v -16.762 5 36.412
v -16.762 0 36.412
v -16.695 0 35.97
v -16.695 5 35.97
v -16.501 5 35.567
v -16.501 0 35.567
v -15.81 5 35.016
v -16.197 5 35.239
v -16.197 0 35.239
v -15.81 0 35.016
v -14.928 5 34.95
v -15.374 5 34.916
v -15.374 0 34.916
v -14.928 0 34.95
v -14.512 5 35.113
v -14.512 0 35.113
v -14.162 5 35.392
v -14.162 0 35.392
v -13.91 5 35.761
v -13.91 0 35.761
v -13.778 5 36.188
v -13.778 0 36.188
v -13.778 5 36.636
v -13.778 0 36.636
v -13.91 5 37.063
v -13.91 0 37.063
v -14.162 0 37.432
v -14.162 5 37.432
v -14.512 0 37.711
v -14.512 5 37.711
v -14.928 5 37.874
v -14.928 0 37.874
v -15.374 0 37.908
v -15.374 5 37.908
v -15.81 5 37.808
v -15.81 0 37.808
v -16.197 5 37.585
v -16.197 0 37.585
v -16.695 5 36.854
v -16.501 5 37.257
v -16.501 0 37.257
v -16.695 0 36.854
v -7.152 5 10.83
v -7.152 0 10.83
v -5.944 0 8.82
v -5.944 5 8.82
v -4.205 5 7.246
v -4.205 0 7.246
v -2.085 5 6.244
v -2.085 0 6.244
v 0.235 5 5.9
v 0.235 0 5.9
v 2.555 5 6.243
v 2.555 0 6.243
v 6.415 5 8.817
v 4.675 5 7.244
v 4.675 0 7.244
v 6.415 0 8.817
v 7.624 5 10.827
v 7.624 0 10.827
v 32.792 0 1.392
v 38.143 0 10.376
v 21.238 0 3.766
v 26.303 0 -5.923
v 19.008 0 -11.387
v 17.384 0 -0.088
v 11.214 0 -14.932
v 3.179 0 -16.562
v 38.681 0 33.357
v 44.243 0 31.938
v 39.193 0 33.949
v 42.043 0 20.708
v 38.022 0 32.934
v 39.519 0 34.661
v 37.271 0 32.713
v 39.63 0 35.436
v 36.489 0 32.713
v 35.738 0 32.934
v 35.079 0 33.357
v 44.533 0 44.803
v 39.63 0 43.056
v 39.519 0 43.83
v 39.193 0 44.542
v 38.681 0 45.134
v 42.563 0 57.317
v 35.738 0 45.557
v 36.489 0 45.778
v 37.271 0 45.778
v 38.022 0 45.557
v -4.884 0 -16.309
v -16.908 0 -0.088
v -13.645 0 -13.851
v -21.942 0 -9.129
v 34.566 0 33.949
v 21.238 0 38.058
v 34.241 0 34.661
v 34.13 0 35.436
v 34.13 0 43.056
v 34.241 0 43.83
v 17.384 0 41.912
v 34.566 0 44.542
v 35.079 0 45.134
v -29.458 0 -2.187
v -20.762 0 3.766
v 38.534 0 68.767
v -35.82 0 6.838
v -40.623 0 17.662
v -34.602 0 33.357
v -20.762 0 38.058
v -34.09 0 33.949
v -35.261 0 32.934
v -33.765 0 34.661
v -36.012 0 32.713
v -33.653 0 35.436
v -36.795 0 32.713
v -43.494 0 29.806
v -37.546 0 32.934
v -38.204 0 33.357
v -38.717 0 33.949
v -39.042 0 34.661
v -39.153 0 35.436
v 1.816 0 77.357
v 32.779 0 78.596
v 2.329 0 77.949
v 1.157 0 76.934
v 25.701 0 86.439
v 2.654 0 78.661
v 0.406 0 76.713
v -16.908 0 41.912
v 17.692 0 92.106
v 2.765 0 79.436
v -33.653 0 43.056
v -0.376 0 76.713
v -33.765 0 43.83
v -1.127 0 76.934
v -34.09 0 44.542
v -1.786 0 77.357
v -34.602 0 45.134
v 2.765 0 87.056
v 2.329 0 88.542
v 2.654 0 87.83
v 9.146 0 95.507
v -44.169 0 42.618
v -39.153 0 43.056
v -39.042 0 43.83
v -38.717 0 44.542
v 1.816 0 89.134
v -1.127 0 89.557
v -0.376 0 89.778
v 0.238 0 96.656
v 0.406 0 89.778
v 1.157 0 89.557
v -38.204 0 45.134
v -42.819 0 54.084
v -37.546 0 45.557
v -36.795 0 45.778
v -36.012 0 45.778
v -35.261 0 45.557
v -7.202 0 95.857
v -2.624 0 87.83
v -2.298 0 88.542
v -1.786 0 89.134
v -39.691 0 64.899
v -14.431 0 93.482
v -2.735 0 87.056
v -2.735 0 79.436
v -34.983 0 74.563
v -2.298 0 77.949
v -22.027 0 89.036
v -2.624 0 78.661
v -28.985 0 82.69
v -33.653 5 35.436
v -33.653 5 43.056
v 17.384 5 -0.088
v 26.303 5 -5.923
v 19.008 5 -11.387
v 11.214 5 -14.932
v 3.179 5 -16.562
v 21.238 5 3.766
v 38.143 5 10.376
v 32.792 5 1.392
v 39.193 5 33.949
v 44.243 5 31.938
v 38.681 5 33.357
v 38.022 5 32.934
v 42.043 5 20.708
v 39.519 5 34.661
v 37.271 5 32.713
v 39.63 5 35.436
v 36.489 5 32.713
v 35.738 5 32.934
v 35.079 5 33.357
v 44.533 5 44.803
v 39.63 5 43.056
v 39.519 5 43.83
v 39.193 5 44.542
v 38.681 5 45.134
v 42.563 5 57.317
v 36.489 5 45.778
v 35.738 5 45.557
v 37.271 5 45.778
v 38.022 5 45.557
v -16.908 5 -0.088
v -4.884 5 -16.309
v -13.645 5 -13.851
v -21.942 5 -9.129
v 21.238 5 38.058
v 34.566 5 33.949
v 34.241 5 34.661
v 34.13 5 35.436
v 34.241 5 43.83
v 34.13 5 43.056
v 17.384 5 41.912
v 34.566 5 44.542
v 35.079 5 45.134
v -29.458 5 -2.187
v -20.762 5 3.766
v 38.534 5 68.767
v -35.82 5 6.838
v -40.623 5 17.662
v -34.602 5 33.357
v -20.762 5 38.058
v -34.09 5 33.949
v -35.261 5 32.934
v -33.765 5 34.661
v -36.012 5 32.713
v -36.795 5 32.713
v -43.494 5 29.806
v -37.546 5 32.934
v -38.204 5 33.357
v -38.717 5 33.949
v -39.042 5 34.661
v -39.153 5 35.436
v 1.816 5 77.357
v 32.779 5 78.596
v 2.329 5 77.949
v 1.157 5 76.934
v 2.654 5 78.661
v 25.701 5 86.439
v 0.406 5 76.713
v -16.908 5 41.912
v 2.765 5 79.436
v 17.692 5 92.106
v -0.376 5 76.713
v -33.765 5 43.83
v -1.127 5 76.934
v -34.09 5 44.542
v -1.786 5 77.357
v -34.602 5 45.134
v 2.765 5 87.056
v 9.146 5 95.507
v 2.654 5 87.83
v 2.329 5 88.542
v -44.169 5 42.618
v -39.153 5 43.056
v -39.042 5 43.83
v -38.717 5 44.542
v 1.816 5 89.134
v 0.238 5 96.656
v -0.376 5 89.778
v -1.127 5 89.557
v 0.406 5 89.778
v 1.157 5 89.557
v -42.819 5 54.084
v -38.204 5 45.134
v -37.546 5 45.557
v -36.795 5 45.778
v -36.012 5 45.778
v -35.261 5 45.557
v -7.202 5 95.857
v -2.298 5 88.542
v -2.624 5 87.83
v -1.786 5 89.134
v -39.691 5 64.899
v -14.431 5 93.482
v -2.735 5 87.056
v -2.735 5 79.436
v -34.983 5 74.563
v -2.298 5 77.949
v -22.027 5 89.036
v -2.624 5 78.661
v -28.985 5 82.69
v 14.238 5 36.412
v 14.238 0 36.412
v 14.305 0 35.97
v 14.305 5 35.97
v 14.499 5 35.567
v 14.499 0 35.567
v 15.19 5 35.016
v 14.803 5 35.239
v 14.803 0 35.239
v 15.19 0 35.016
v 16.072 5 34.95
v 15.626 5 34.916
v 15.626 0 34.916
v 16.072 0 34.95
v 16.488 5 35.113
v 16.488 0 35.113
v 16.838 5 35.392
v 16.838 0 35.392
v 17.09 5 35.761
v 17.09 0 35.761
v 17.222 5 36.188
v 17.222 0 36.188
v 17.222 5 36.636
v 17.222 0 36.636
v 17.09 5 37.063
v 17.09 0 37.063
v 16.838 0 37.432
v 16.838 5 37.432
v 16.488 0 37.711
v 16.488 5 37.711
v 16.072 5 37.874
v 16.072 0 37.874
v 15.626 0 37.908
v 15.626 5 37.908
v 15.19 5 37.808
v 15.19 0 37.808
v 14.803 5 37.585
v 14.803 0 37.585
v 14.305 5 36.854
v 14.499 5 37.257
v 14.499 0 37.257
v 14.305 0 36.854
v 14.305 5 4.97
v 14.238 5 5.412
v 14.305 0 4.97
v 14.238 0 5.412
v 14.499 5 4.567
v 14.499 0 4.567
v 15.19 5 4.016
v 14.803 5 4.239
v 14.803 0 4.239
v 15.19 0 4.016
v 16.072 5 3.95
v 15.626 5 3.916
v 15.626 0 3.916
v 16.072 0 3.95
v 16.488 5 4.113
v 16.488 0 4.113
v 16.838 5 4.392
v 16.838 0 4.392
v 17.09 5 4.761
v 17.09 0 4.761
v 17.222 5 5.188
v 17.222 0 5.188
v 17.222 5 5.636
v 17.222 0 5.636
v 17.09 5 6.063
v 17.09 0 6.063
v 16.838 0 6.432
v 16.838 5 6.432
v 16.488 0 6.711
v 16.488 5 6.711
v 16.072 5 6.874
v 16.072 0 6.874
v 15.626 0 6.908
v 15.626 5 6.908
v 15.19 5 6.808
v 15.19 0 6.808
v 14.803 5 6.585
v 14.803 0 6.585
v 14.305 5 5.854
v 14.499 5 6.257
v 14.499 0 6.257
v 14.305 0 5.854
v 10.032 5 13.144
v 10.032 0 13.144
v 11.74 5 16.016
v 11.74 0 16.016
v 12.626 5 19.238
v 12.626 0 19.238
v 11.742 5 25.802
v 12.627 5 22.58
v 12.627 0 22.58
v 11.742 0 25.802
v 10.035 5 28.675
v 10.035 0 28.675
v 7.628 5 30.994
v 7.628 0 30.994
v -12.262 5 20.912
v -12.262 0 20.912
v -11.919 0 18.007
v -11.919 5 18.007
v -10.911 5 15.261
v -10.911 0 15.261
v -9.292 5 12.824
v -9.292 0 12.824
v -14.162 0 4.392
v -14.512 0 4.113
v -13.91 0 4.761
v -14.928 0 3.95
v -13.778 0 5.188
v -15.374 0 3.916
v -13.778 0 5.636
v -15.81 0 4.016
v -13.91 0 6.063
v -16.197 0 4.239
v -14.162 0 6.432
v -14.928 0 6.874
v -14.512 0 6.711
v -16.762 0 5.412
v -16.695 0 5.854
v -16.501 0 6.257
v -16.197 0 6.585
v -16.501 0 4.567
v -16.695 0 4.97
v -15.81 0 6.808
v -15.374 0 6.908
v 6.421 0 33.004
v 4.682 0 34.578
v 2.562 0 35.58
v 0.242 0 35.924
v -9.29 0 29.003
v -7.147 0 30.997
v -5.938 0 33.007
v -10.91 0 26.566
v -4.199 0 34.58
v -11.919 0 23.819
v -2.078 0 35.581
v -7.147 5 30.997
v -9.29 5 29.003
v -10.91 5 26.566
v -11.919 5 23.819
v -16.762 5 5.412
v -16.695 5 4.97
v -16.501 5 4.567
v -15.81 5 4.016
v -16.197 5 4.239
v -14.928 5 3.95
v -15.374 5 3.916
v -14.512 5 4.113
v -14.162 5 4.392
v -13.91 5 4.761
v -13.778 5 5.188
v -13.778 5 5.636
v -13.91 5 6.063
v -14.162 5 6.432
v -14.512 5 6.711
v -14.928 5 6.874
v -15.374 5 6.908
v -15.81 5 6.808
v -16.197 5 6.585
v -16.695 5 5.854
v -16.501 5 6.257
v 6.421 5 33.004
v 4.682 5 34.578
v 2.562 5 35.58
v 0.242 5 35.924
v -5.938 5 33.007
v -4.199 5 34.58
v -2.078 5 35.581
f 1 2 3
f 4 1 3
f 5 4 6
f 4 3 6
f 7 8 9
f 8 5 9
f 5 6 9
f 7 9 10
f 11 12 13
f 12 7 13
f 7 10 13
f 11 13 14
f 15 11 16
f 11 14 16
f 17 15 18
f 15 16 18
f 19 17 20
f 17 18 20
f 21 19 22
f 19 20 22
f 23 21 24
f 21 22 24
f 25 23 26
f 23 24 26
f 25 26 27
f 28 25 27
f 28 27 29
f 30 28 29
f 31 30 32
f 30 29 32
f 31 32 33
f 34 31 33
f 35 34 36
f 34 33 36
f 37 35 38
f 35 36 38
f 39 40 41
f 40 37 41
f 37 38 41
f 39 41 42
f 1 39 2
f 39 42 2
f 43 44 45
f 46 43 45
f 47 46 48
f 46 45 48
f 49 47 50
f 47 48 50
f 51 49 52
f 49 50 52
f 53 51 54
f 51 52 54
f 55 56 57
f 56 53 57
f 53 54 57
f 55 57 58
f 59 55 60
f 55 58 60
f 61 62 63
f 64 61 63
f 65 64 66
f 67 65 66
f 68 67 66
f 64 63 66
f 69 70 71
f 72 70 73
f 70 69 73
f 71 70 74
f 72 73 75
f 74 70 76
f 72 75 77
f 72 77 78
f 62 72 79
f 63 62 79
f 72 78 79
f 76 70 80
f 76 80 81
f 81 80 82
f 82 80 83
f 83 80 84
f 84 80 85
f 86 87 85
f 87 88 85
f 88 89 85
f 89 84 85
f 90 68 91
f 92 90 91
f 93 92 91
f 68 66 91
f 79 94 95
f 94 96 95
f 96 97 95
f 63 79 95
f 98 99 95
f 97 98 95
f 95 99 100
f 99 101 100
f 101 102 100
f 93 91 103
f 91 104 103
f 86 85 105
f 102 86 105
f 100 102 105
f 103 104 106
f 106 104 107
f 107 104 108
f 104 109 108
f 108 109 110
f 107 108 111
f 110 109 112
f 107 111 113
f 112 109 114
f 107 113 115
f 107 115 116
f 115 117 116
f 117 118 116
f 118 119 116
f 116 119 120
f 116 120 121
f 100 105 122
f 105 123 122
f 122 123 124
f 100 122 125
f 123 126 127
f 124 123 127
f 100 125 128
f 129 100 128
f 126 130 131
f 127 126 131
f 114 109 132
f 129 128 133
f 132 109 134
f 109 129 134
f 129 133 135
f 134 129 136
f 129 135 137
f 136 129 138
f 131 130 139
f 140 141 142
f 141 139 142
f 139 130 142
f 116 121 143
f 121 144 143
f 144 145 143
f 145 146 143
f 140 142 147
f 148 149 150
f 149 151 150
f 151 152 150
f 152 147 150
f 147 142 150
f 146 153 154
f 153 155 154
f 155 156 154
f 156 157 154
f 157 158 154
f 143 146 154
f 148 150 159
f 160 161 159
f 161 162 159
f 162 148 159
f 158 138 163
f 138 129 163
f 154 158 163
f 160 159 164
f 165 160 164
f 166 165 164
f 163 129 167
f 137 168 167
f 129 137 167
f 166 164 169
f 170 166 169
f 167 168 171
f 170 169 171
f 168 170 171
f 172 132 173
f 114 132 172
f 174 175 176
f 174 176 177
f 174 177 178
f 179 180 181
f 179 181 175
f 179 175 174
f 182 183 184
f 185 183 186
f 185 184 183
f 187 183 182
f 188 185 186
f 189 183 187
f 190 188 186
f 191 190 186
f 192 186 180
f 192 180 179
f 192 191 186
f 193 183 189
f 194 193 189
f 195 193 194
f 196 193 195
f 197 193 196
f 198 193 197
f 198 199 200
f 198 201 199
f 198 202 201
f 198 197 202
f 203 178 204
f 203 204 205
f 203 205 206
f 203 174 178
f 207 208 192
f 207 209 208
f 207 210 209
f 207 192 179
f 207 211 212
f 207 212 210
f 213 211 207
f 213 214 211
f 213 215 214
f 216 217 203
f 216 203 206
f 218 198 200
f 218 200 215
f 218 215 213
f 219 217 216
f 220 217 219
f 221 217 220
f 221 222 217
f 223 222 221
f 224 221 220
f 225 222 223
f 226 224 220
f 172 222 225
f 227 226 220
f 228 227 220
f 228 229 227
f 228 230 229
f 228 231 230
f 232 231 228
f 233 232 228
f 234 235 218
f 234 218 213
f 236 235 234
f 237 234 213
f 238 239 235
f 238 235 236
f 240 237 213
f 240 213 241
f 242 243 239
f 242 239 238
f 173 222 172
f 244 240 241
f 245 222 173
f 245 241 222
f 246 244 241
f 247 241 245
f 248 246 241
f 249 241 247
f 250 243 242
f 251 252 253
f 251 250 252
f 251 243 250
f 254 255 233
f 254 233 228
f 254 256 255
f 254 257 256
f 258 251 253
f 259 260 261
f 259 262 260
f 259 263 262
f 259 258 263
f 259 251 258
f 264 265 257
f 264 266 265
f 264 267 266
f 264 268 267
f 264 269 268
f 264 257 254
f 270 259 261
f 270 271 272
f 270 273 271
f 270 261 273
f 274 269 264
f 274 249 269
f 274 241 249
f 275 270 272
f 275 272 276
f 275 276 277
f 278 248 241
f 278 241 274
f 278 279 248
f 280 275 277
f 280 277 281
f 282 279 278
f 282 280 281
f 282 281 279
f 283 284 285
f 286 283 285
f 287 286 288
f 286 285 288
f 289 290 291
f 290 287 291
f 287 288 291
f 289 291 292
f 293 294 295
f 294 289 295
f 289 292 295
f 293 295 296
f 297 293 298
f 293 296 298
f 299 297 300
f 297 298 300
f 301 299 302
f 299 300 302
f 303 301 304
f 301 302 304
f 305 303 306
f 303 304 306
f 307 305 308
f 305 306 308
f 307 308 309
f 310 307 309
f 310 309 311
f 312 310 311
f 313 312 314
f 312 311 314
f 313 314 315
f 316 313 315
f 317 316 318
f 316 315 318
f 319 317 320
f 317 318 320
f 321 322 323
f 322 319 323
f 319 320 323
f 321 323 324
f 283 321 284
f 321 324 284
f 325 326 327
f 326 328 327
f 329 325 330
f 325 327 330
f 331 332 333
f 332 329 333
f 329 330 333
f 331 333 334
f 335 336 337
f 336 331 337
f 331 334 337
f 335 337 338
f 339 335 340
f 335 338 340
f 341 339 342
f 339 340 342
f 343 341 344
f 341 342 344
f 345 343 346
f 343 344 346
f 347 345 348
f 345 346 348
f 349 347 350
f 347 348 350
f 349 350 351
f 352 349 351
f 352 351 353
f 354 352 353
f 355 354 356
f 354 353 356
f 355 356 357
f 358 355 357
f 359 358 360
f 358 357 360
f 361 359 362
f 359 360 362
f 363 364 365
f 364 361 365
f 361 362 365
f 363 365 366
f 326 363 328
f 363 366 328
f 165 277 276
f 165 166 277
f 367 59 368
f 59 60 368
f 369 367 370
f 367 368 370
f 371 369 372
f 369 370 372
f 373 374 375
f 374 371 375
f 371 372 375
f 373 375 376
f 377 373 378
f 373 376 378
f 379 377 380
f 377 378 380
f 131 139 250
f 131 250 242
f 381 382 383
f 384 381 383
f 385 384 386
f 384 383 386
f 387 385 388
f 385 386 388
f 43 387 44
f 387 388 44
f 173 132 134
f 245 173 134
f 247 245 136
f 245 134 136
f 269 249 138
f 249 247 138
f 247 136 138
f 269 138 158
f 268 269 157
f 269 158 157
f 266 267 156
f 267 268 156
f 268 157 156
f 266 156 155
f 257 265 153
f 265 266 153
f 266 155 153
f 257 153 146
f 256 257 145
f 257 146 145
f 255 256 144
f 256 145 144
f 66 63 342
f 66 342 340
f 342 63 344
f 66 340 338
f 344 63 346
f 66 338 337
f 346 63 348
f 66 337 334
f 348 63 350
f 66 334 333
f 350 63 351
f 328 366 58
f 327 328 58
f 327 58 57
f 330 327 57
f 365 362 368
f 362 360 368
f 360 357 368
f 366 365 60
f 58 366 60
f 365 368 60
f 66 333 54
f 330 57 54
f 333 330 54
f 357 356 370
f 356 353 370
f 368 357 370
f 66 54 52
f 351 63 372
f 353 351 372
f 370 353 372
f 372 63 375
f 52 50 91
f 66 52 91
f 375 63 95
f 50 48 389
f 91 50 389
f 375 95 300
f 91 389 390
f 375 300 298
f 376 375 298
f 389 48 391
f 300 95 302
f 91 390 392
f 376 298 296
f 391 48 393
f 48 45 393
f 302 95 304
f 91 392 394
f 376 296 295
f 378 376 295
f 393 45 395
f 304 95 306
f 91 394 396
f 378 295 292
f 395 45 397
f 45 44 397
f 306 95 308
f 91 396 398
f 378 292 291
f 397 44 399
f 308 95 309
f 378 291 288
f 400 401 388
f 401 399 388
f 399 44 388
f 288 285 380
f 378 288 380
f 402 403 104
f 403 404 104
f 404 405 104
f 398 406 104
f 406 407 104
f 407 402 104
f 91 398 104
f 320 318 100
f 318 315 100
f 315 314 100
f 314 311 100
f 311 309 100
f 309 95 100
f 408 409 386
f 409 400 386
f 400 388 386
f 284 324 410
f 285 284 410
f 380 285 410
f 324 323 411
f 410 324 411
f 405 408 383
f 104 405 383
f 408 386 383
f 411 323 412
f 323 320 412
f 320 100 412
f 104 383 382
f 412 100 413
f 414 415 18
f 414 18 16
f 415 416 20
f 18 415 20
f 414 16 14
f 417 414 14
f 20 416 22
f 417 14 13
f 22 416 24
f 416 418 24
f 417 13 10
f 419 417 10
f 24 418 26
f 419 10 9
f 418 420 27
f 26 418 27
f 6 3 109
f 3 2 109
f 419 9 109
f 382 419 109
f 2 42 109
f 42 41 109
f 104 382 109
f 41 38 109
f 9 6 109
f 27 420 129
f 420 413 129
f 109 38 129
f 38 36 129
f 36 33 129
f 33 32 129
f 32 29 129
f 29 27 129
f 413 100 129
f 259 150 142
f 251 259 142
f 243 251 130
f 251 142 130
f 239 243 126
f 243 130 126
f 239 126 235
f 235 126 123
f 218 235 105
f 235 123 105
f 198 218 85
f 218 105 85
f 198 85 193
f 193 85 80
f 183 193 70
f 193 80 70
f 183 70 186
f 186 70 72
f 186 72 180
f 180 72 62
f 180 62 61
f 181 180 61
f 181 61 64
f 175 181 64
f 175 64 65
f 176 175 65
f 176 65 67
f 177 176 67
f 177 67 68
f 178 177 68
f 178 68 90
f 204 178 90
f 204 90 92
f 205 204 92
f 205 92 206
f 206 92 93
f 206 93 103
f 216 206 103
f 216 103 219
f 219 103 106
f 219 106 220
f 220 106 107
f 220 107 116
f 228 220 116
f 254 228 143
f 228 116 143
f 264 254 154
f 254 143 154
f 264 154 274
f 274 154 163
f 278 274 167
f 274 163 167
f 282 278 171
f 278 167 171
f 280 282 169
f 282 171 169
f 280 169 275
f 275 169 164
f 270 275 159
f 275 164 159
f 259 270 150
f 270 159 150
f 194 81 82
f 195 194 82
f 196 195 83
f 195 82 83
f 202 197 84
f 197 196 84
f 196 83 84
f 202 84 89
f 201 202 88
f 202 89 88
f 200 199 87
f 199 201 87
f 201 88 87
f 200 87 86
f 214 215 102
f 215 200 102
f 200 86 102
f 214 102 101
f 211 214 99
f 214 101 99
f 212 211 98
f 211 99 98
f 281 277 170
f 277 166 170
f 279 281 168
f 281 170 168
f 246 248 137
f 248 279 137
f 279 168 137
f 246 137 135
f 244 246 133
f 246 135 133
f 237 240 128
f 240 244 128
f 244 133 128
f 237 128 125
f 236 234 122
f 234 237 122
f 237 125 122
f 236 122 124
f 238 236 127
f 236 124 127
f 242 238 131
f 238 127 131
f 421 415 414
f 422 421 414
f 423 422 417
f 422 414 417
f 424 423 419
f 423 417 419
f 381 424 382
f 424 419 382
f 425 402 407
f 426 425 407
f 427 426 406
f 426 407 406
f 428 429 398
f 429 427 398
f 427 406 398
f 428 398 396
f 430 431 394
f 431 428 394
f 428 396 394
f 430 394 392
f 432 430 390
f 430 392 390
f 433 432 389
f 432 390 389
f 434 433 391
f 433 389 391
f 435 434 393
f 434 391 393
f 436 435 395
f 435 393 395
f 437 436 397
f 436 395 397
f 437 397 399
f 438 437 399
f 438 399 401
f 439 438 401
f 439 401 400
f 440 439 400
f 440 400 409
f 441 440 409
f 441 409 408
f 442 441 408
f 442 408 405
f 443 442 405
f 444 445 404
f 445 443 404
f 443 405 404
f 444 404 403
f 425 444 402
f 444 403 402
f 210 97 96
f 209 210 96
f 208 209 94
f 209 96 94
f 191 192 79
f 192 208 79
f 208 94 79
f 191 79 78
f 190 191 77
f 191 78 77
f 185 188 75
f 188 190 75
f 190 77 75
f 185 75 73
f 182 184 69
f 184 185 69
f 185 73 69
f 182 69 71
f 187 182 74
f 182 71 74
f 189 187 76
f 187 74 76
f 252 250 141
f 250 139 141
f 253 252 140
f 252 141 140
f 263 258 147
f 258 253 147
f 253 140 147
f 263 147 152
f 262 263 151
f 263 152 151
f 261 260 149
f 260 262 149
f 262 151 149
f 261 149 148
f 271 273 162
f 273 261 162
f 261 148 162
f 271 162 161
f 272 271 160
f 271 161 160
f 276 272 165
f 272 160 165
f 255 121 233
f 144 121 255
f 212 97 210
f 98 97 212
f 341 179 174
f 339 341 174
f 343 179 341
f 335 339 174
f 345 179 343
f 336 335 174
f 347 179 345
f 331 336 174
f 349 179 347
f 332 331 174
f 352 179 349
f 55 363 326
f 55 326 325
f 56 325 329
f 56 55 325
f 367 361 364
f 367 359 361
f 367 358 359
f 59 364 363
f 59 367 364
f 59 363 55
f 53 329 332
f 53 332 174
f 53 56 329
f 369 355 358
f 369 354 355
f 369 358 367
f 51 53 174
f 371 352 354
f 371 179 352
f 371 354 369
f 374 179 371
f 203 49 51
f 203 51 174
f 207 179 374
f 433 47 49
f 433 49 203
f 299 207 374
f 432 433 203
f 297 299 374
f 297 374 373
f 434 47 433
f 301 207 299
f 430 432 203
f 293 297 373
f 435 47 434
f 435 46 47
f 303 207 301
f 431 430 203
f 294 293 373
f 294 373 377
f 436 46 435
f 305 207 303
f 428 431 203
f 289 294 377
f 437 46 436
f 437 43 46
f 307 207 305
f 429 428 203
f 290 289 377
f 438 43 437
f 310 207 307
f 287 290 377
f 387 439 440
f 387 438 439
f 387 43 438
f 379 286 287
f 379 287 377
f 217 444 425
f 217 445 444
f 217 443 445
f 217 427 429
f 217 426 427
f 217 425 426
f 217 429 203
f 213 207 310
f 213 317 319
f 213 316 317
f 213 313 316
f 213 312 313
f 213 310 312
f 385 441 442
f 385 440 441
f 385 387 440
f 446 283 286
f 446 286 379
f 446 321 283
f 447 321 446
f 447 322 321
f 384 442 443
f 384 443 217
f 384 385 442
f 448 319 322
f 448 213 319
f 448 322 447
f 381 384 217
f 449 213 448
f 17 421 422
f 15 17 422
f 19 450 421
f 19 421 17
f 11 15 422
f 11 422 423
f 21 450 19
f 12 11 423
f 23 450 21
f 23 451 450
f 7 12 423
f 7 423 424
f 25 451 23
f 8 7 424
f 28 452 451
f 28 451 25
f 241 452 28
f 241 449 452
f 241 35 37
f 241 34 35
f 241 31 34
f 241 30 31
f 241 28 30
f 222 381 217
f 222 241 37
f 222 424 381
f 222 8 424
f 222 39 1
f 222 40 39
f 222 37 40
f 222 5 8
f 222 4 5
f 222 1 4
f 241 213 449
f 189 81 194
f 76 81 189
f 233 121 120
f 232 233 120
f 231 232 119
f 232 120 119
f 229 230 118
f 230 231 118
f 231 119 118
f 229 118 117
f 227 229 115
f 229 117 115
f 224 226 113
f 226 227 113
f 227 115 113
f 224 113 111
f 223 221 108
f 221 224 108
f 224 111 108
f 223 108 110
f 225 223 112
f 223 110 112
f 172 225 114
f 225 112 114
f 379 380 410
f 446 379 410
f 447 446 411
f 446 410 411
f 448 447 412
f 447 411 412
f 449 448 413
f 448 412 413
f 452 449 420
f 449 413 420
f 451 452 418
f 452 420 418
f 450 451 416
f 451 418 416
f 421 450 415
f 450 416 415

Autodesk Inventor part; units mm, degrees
ref_plane "YZ Plane" through (0, 0, 0) normal (1, 0, 0) x (0, 1, 0)
ref_plane "XZ Plane" through (0, 0, 0) normal (0, 1, 0) x (-1, 0, 0)
ref_plane "XY Plane" through (0, 0, 0) normal (0, 0, 1) x (1, 0, 0)
sketch "Sketch1" plane through (0, 0, 0) normal (0, 1, 0) x (-1, 0, 0)
  line L0 (15.2617, 5.412) -> (-15.7383, 36.412) construction
  line L1 (15.2617, 36.412) -> (-15.7383, 5.412) construction
  line L2 (48.4032, 51.2455) -> (-48.8799, 51.2455) construction
  line L3 (-48.8799, 51.2455) -> (-48.8799, 71.2455) construction
  line L4 (-48.8799, 71.2455) -> (48.4032, 71.2455) construction
  line L5 (48.4032, 71.2455) -> (48.4032, 51.2455) construction
  line L6 (48.4032, 51.2455) -> (-48.8799, 71.2455) construction
  line L7 (-48.8799, 51.2455) -> (48.4032, 71.2455) construction
  line L8 (16.9077, -0.088) -> (-17.3843, -0.088)
  line L9 (-21.2383, 3.766) -> (-21.2383, 38.058)
  line L10 (-17.3843, 41.912) -> (16.9077, 41.912)
  line L11 (20.7617, 38.058) -> (20.7617, 3.766)
  line L12 (20.7617, -0.088) -> (-21.2383, 41.912) construction
  line L13 (-21.2383, -0.088) -> (20.7617, 41.912) construction
  line L14 (20.7617, 3.766) -> (16.9077, -0.088)
  line L15 (-17.3843, -0.088) -> (-21.2383, 3.766)
  line L16 (-17.3843, 41.912) -> (-21.2383, 38.058)
  line L17 (16.9077, 41.912) -> (20.7617, 38.058)
  circle A0 centre (36.4032, 39.2455) radius 12 construction
  circle A1 centre (-36.8799, 39.2455) radius 12 construction
  circle A2 centre (-0.0151, 83.2455) radius 12 construction
  line L18 (-0.2367, 13.9012) -> (-0.24, 27.9229) construction
  line L19 (7.7643, 13.9031) -> (7.761, 27.9248)
  line L20 (-8.241, 27.921) -> (-8.2377, 13.8992)
  arc A3 (-8.2377, 13.8992) -> (7.7643, 13.9031) centre (-0.2367, 13.9012) ccw
  arc A4 (7.761, 27.9248) -> (-8.241, 27.921) centre (-0.24, 27.9229) ccw
  line L21 (36.4032, 35.4355) -> (36.4032, 43.0555) construction
  line L22 (39.1532, 35.4355) -> (39.1532, 43.0555)
  line L23 (33.6532, 43.0555) -> (33.6532, 35.4355)
  arc A5 (33.6532, 35.4355) -> (39.1532, 35.4355) centre (36.4032, 35.4355) ccw
  arc A6 (39.1532, 43.0555) -> (33.6532, 43.0555) centre (36.4032, 43.0555) ccw
  line L24 (-36.8799, 35.4355) -> (-36.8799, 43.0555) construction
  line L25 (-34.1299, 35.4355) -> (-34.1299, 43.0555)
  line L26 (-39.6299, 43.0555) -> (-39.6299, 35.4355)
  arc A7 (-39.6299, 35.4355) -> (-34.1299, 35.4355) centre (-36.8799, 35.4355) ccw
  arc A8 (-34.1299, 43.0555) -> (-39.6299, 43.0555) centre (-36.8799, 43.0555) ccw
  line L27 (-0.0151, 79.4355) -> (-0.0151, 87.0555) construction
  line L28 (2.7349, 79.4355) -> (2.7349, 87.0555)
  line L29 (-2.7651, 87.0555) -> (-2.7651, 79.4355)
  arc A9 (-2.7651, 79.4355) -> (2.7349, 79.4355) centre (-0.0151, 79.4355) ccw
  arc A10 (2.7349, 87.0555) -> (-2.7651, 87.0555) centre (-0.0151, 87.0555) ccw
  ellipse E0 centre (-0.2383, 39.985) end of major axis (-0.2383, 96.6561) minor radius 44.4552
  circle A11 centre (15.2617, 5.412) radius 1.5
  circle A12 centre (-15.7383, 5.412) radius 1.5
  circle A13 centre (-15.7383, 36.412) radius 1.5
  circle A14 centre (15.2617, 36.412) radius 1.5
  circle A15 centre (-0.2383, 20.912) radius 12.5
  point P0 (-0.2383, 61.2455)
  point P1 (-0.2383, 61.2455)
  point P2 (-0.2383, 20.912)
  point P3 (7.1468, 30.9972)
  point P4 (7.1516, 10.8304)
  point P5 (-7.6234, 10.8269)
  point P6 (-7.6283, 30.9936)
  dimension "d45" = 31
  dimension "d46" = 31
  dimension "d47" = 20
  dimension "d48" = 12
  dimension "d49" = 12
  dimension "d50" = 42
  dimension "d51" = 42
  dimension "d52" = 3.854
  dimension "d53" = 45
  dimension "d54" = 3.854
  dimension "d55" = 45
  dimension "d56" = 3.854
  dimension "d57" = 45
  dimension "d58" = 3.854
  dimension "d59" = 45
  dimension "d60" = 12
  dimension "d61" = 16.002
  dimension "d63" = 3.81
  dimension "d64" = 5.5
  dimension "d65" = 3.81
  dimension "d66" = 5.5
  dimension "d67" = 3.81
  dimension "d68" = 5.5
  dimension "d71" = 3
  dimension "d72" = 3
  dimension "d73" = 3
  dimension "d74" = 3
  dimension "d75" = 25
extrude "Extrusion4" add sketch "Sketch1" along normal blind 5 contours L8 L15 L9 L16 L10 L17 L11 L14 | E0
equation "\"d46\" = d45"
equation "\"d49\" = d48"
equation "\"d54\" = d52"
equation "\"d56\" = d54"
equation "\"d57\" = d55"
equation "\"d58\" = d54"
equation "\"d59\" = d55"
equation "\"d60\" = d49"
equation "\"d65\" = d63"
equation "\"d66\" = d64"
equation "\"d67\" = d65"
equation "\"d68\" = d64"
equation "\"d72\" = d71"
equation "\"d73\" = d72"
equation "\"d74\" = d73"
properties part number "Base Plate" material "Acrylic"
